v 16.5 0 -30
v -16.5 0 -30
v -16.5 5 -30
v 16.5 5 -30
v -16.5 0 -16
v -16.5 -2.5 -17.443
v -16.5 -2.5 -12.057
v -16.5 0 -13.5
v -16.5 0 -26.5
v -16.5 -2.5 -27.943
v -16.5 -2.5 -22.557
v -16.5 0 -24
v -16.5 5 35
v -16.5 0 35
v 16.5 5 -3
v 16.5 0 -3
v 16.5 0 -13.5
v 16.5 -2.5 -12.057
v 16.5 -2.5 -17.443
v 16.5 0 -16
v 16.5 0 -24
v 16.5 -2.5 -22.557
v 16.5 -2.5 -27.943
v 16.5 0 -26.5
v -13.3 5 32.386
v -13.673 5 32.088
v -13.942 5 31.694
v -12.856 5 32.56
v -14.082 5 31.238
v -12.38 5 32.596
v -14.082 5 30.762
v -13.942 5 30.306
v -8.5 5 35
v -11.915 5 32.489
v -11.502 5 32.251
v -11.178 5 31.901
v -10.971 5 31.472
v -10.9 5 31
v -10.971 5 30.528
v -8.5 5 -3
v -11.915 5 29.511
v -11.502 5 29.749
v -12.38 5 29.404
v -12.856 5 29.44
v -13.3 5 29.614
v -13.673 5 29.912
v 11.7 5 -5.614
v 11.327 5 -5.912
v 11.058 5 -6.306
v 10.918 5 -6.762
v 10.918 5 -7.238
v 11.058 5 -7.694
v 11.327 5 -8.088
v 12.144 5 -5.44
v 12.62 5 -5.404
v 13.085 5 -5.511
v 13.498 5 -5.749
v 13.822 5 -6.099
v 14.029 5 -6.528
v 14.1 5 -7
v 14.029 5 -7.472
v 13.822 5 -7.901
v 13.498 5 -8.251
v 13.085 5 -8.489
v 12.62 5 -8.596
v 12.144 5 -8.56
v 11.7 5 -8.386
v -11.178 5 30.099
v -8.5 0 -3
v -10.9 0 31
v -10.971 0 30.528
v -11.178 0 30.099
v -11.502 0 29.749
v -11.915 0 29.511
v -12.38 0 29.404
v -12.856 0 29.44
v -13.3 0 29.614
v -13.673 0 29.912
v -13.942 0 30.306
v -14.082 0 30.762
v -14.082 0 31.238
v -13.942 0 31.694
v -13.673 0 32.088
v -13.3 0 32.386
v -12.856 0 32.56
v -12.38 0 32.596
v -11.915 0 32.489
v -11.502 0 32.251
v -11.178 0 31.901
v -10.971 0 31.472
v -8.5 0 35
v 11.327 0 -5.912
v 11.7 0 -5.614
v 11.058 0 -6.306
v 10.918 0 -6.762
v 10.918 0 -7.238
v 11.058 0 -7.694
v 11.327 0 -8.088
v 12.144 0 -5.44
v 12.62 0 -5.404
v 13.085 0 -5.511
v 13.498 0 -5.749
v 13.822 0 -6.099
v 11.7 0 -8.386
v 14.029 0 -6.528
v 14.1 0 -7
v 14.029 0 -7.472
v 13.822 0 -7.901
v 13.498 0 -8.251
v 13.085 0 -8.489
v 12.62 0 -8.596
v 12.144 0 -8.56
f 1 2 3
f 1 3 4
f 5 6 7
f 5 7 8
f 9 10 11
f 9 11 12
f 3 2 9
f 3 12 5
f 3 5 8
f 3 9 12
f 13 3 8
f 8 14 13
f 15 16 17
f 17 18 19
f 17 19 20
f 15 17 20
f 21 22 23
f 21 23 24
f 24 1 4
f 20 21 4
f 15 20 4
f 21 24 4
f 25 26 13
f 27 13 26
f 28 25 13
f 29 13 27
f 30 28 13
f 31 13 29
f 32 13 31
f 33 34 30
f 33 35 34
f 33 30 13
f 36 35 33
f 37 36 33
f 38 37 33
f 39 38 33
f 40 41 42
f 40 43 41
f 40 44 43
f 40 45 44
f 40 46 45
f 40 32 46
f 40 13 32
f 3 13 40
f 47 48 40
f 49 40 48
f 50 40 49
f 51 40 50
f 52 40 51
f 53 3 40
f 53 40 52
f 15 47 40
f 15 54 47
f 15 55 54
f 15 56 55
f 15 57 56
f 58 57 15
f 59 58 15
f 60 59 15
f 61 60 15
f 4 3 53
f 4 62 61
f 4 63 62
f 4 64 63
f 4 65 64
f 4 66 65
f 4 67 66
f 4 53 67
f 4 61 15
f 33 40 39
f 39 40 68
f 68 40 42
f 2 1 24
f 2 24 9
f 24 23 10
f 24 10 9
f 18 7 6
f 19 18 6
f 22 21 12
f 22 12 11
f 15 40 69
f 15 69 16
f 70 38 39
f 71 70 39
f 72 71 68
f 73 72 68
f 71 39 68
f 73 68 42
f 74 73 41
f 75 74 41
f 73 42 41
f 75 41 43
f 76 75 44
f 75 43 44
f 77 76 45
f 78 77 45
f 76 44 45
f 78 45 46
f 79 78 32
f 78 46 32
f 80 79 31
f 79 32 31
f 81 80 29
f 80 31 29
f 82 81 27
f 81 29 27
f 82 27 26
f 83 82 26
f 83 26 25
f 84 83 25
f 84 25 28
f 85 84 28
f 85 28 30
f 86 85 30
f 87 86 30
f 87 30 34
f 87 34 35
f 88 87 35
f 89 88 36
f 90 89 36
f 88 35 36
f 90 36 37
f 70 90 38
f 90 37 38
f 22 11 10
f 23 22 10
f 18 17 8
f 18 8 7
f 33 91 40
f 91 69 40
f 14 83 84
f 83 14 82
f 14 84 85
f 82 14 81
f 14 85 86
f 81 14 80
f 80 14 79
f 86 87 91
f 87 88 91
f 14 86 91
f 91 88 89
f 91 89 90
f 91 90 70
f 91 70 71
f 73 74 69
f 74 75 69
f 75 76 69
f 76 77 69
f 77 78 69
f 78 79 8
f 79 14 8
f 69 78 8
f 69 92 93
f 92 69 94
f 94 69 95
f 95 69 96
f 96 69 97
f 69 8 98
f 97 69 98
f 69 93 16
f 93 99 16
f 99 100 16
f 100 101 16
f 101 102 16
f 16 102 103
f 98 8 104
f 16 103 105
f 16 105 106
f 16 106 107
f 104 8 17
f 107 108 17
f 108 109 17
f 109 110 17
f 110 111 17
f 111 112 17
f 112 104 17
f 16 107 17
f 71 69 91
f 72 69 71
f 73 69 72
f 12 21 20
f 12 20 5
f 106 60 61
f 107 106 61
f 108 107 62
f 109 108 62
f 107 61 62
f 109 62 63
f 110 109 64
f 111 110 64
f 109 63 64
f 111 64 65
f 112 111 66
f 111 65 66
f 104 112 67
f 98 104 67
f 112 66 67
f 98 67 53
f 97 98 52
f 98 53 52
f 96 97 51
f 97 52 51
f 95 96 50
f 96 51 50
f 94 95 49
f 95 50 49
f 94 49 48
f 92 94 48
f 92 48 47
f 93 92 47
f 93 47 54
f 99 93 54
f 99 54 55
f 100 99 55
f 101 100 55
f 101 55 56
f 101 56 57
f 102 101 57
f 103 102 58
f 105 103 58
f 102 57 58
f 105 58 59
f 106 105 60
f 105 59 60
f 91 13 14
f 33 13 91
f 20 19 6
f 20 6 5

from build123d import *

# Parameters (mm, degrees)
BOSS_EXTRUDE1_DEPTH = 5
BOSS_EXTRUDE3_DEPTH = 33
SKETCH4_W           = 25
SKETCH4_H           = 5
BOSS_EXTRUDE4_DEPTH = 7
SKETCH5_W           = 8
SKETCH5_H           = 5
BOSS_EXTRUDE5_DEPTH = 5
SKETCH6_R           = 1.6
CUT_EXTRUDE1_DEPTH  = 5


with BuildPart() as part:
    # Sketch1 → Boss-Extrude1 (new body)
    with BuildSketch(Plane(origin=(0, 0, 0), x_dir=(1, 0, 0), z_dir=(0, 1, 0))):
        Polygon((-8.5, 10), (-8.5, -30), (-16.5, -30), (-16.5, 30), (16.5, 30), (16.5, 10), align=None)
    extrude(amount=BOSS_EXTRUDE1_DEPTH)

    # Sketch3 → Boss-Extrude3 (add)
    with BuildSketch(Plane(origin=(16.5, 0, 0), x_dir=(0, 0, -1), z_dir=(1, 0, 0))):
        Polygon((17.443375673, -2.5), (16, 0), (13.5, 0), (12.056624327, -2.5), align=None)
        Polygon((22.556624327, -2.5), (27.943375673, -2.5), (26.5, 0), (24, 0), align=None)
    extrude(amount=-BOSS_EXTRUDE3_DEPTH)

    # Sketch4 → Boss-Extrude4 (add)
    with BuildSketch(Plane.XY.offset(-10)):
        with Locations((4, 2.5)):
            Rectangle(SKETCH4_W, SKETCH4_H)
    extrude(amount=BOSS_EXTRUDE4_DEPTH)

    # Sketch5 → Boss-Extrude5 (add)
    with BuildSketch(Plane.XY.offset(30)):
        with Locations((-12.5, 2.5)):
            Rectangle(SKETCH5_W, SKETCH5_H)
    extrude(amount=BOSS_EXTRUDE5_DEPTH)

    # Sketch6 → Cut-Extrude1 (cut)
    with BuildSketch(Plane(origin=(0, 5, 0), x_dir=(1, 0, 0), z_dir=(0, 1, 0))):
        with Locations((12.5, 7)):
            Circle(SKETCH6_R)
        with Locations((-12.5, -31)):
            Circle(SKETCH6_R)
    extrude(amount=-CUT_EXTRUDE1_DEPTH, mode=Mode.SUBTRACT)


solid = part.part
